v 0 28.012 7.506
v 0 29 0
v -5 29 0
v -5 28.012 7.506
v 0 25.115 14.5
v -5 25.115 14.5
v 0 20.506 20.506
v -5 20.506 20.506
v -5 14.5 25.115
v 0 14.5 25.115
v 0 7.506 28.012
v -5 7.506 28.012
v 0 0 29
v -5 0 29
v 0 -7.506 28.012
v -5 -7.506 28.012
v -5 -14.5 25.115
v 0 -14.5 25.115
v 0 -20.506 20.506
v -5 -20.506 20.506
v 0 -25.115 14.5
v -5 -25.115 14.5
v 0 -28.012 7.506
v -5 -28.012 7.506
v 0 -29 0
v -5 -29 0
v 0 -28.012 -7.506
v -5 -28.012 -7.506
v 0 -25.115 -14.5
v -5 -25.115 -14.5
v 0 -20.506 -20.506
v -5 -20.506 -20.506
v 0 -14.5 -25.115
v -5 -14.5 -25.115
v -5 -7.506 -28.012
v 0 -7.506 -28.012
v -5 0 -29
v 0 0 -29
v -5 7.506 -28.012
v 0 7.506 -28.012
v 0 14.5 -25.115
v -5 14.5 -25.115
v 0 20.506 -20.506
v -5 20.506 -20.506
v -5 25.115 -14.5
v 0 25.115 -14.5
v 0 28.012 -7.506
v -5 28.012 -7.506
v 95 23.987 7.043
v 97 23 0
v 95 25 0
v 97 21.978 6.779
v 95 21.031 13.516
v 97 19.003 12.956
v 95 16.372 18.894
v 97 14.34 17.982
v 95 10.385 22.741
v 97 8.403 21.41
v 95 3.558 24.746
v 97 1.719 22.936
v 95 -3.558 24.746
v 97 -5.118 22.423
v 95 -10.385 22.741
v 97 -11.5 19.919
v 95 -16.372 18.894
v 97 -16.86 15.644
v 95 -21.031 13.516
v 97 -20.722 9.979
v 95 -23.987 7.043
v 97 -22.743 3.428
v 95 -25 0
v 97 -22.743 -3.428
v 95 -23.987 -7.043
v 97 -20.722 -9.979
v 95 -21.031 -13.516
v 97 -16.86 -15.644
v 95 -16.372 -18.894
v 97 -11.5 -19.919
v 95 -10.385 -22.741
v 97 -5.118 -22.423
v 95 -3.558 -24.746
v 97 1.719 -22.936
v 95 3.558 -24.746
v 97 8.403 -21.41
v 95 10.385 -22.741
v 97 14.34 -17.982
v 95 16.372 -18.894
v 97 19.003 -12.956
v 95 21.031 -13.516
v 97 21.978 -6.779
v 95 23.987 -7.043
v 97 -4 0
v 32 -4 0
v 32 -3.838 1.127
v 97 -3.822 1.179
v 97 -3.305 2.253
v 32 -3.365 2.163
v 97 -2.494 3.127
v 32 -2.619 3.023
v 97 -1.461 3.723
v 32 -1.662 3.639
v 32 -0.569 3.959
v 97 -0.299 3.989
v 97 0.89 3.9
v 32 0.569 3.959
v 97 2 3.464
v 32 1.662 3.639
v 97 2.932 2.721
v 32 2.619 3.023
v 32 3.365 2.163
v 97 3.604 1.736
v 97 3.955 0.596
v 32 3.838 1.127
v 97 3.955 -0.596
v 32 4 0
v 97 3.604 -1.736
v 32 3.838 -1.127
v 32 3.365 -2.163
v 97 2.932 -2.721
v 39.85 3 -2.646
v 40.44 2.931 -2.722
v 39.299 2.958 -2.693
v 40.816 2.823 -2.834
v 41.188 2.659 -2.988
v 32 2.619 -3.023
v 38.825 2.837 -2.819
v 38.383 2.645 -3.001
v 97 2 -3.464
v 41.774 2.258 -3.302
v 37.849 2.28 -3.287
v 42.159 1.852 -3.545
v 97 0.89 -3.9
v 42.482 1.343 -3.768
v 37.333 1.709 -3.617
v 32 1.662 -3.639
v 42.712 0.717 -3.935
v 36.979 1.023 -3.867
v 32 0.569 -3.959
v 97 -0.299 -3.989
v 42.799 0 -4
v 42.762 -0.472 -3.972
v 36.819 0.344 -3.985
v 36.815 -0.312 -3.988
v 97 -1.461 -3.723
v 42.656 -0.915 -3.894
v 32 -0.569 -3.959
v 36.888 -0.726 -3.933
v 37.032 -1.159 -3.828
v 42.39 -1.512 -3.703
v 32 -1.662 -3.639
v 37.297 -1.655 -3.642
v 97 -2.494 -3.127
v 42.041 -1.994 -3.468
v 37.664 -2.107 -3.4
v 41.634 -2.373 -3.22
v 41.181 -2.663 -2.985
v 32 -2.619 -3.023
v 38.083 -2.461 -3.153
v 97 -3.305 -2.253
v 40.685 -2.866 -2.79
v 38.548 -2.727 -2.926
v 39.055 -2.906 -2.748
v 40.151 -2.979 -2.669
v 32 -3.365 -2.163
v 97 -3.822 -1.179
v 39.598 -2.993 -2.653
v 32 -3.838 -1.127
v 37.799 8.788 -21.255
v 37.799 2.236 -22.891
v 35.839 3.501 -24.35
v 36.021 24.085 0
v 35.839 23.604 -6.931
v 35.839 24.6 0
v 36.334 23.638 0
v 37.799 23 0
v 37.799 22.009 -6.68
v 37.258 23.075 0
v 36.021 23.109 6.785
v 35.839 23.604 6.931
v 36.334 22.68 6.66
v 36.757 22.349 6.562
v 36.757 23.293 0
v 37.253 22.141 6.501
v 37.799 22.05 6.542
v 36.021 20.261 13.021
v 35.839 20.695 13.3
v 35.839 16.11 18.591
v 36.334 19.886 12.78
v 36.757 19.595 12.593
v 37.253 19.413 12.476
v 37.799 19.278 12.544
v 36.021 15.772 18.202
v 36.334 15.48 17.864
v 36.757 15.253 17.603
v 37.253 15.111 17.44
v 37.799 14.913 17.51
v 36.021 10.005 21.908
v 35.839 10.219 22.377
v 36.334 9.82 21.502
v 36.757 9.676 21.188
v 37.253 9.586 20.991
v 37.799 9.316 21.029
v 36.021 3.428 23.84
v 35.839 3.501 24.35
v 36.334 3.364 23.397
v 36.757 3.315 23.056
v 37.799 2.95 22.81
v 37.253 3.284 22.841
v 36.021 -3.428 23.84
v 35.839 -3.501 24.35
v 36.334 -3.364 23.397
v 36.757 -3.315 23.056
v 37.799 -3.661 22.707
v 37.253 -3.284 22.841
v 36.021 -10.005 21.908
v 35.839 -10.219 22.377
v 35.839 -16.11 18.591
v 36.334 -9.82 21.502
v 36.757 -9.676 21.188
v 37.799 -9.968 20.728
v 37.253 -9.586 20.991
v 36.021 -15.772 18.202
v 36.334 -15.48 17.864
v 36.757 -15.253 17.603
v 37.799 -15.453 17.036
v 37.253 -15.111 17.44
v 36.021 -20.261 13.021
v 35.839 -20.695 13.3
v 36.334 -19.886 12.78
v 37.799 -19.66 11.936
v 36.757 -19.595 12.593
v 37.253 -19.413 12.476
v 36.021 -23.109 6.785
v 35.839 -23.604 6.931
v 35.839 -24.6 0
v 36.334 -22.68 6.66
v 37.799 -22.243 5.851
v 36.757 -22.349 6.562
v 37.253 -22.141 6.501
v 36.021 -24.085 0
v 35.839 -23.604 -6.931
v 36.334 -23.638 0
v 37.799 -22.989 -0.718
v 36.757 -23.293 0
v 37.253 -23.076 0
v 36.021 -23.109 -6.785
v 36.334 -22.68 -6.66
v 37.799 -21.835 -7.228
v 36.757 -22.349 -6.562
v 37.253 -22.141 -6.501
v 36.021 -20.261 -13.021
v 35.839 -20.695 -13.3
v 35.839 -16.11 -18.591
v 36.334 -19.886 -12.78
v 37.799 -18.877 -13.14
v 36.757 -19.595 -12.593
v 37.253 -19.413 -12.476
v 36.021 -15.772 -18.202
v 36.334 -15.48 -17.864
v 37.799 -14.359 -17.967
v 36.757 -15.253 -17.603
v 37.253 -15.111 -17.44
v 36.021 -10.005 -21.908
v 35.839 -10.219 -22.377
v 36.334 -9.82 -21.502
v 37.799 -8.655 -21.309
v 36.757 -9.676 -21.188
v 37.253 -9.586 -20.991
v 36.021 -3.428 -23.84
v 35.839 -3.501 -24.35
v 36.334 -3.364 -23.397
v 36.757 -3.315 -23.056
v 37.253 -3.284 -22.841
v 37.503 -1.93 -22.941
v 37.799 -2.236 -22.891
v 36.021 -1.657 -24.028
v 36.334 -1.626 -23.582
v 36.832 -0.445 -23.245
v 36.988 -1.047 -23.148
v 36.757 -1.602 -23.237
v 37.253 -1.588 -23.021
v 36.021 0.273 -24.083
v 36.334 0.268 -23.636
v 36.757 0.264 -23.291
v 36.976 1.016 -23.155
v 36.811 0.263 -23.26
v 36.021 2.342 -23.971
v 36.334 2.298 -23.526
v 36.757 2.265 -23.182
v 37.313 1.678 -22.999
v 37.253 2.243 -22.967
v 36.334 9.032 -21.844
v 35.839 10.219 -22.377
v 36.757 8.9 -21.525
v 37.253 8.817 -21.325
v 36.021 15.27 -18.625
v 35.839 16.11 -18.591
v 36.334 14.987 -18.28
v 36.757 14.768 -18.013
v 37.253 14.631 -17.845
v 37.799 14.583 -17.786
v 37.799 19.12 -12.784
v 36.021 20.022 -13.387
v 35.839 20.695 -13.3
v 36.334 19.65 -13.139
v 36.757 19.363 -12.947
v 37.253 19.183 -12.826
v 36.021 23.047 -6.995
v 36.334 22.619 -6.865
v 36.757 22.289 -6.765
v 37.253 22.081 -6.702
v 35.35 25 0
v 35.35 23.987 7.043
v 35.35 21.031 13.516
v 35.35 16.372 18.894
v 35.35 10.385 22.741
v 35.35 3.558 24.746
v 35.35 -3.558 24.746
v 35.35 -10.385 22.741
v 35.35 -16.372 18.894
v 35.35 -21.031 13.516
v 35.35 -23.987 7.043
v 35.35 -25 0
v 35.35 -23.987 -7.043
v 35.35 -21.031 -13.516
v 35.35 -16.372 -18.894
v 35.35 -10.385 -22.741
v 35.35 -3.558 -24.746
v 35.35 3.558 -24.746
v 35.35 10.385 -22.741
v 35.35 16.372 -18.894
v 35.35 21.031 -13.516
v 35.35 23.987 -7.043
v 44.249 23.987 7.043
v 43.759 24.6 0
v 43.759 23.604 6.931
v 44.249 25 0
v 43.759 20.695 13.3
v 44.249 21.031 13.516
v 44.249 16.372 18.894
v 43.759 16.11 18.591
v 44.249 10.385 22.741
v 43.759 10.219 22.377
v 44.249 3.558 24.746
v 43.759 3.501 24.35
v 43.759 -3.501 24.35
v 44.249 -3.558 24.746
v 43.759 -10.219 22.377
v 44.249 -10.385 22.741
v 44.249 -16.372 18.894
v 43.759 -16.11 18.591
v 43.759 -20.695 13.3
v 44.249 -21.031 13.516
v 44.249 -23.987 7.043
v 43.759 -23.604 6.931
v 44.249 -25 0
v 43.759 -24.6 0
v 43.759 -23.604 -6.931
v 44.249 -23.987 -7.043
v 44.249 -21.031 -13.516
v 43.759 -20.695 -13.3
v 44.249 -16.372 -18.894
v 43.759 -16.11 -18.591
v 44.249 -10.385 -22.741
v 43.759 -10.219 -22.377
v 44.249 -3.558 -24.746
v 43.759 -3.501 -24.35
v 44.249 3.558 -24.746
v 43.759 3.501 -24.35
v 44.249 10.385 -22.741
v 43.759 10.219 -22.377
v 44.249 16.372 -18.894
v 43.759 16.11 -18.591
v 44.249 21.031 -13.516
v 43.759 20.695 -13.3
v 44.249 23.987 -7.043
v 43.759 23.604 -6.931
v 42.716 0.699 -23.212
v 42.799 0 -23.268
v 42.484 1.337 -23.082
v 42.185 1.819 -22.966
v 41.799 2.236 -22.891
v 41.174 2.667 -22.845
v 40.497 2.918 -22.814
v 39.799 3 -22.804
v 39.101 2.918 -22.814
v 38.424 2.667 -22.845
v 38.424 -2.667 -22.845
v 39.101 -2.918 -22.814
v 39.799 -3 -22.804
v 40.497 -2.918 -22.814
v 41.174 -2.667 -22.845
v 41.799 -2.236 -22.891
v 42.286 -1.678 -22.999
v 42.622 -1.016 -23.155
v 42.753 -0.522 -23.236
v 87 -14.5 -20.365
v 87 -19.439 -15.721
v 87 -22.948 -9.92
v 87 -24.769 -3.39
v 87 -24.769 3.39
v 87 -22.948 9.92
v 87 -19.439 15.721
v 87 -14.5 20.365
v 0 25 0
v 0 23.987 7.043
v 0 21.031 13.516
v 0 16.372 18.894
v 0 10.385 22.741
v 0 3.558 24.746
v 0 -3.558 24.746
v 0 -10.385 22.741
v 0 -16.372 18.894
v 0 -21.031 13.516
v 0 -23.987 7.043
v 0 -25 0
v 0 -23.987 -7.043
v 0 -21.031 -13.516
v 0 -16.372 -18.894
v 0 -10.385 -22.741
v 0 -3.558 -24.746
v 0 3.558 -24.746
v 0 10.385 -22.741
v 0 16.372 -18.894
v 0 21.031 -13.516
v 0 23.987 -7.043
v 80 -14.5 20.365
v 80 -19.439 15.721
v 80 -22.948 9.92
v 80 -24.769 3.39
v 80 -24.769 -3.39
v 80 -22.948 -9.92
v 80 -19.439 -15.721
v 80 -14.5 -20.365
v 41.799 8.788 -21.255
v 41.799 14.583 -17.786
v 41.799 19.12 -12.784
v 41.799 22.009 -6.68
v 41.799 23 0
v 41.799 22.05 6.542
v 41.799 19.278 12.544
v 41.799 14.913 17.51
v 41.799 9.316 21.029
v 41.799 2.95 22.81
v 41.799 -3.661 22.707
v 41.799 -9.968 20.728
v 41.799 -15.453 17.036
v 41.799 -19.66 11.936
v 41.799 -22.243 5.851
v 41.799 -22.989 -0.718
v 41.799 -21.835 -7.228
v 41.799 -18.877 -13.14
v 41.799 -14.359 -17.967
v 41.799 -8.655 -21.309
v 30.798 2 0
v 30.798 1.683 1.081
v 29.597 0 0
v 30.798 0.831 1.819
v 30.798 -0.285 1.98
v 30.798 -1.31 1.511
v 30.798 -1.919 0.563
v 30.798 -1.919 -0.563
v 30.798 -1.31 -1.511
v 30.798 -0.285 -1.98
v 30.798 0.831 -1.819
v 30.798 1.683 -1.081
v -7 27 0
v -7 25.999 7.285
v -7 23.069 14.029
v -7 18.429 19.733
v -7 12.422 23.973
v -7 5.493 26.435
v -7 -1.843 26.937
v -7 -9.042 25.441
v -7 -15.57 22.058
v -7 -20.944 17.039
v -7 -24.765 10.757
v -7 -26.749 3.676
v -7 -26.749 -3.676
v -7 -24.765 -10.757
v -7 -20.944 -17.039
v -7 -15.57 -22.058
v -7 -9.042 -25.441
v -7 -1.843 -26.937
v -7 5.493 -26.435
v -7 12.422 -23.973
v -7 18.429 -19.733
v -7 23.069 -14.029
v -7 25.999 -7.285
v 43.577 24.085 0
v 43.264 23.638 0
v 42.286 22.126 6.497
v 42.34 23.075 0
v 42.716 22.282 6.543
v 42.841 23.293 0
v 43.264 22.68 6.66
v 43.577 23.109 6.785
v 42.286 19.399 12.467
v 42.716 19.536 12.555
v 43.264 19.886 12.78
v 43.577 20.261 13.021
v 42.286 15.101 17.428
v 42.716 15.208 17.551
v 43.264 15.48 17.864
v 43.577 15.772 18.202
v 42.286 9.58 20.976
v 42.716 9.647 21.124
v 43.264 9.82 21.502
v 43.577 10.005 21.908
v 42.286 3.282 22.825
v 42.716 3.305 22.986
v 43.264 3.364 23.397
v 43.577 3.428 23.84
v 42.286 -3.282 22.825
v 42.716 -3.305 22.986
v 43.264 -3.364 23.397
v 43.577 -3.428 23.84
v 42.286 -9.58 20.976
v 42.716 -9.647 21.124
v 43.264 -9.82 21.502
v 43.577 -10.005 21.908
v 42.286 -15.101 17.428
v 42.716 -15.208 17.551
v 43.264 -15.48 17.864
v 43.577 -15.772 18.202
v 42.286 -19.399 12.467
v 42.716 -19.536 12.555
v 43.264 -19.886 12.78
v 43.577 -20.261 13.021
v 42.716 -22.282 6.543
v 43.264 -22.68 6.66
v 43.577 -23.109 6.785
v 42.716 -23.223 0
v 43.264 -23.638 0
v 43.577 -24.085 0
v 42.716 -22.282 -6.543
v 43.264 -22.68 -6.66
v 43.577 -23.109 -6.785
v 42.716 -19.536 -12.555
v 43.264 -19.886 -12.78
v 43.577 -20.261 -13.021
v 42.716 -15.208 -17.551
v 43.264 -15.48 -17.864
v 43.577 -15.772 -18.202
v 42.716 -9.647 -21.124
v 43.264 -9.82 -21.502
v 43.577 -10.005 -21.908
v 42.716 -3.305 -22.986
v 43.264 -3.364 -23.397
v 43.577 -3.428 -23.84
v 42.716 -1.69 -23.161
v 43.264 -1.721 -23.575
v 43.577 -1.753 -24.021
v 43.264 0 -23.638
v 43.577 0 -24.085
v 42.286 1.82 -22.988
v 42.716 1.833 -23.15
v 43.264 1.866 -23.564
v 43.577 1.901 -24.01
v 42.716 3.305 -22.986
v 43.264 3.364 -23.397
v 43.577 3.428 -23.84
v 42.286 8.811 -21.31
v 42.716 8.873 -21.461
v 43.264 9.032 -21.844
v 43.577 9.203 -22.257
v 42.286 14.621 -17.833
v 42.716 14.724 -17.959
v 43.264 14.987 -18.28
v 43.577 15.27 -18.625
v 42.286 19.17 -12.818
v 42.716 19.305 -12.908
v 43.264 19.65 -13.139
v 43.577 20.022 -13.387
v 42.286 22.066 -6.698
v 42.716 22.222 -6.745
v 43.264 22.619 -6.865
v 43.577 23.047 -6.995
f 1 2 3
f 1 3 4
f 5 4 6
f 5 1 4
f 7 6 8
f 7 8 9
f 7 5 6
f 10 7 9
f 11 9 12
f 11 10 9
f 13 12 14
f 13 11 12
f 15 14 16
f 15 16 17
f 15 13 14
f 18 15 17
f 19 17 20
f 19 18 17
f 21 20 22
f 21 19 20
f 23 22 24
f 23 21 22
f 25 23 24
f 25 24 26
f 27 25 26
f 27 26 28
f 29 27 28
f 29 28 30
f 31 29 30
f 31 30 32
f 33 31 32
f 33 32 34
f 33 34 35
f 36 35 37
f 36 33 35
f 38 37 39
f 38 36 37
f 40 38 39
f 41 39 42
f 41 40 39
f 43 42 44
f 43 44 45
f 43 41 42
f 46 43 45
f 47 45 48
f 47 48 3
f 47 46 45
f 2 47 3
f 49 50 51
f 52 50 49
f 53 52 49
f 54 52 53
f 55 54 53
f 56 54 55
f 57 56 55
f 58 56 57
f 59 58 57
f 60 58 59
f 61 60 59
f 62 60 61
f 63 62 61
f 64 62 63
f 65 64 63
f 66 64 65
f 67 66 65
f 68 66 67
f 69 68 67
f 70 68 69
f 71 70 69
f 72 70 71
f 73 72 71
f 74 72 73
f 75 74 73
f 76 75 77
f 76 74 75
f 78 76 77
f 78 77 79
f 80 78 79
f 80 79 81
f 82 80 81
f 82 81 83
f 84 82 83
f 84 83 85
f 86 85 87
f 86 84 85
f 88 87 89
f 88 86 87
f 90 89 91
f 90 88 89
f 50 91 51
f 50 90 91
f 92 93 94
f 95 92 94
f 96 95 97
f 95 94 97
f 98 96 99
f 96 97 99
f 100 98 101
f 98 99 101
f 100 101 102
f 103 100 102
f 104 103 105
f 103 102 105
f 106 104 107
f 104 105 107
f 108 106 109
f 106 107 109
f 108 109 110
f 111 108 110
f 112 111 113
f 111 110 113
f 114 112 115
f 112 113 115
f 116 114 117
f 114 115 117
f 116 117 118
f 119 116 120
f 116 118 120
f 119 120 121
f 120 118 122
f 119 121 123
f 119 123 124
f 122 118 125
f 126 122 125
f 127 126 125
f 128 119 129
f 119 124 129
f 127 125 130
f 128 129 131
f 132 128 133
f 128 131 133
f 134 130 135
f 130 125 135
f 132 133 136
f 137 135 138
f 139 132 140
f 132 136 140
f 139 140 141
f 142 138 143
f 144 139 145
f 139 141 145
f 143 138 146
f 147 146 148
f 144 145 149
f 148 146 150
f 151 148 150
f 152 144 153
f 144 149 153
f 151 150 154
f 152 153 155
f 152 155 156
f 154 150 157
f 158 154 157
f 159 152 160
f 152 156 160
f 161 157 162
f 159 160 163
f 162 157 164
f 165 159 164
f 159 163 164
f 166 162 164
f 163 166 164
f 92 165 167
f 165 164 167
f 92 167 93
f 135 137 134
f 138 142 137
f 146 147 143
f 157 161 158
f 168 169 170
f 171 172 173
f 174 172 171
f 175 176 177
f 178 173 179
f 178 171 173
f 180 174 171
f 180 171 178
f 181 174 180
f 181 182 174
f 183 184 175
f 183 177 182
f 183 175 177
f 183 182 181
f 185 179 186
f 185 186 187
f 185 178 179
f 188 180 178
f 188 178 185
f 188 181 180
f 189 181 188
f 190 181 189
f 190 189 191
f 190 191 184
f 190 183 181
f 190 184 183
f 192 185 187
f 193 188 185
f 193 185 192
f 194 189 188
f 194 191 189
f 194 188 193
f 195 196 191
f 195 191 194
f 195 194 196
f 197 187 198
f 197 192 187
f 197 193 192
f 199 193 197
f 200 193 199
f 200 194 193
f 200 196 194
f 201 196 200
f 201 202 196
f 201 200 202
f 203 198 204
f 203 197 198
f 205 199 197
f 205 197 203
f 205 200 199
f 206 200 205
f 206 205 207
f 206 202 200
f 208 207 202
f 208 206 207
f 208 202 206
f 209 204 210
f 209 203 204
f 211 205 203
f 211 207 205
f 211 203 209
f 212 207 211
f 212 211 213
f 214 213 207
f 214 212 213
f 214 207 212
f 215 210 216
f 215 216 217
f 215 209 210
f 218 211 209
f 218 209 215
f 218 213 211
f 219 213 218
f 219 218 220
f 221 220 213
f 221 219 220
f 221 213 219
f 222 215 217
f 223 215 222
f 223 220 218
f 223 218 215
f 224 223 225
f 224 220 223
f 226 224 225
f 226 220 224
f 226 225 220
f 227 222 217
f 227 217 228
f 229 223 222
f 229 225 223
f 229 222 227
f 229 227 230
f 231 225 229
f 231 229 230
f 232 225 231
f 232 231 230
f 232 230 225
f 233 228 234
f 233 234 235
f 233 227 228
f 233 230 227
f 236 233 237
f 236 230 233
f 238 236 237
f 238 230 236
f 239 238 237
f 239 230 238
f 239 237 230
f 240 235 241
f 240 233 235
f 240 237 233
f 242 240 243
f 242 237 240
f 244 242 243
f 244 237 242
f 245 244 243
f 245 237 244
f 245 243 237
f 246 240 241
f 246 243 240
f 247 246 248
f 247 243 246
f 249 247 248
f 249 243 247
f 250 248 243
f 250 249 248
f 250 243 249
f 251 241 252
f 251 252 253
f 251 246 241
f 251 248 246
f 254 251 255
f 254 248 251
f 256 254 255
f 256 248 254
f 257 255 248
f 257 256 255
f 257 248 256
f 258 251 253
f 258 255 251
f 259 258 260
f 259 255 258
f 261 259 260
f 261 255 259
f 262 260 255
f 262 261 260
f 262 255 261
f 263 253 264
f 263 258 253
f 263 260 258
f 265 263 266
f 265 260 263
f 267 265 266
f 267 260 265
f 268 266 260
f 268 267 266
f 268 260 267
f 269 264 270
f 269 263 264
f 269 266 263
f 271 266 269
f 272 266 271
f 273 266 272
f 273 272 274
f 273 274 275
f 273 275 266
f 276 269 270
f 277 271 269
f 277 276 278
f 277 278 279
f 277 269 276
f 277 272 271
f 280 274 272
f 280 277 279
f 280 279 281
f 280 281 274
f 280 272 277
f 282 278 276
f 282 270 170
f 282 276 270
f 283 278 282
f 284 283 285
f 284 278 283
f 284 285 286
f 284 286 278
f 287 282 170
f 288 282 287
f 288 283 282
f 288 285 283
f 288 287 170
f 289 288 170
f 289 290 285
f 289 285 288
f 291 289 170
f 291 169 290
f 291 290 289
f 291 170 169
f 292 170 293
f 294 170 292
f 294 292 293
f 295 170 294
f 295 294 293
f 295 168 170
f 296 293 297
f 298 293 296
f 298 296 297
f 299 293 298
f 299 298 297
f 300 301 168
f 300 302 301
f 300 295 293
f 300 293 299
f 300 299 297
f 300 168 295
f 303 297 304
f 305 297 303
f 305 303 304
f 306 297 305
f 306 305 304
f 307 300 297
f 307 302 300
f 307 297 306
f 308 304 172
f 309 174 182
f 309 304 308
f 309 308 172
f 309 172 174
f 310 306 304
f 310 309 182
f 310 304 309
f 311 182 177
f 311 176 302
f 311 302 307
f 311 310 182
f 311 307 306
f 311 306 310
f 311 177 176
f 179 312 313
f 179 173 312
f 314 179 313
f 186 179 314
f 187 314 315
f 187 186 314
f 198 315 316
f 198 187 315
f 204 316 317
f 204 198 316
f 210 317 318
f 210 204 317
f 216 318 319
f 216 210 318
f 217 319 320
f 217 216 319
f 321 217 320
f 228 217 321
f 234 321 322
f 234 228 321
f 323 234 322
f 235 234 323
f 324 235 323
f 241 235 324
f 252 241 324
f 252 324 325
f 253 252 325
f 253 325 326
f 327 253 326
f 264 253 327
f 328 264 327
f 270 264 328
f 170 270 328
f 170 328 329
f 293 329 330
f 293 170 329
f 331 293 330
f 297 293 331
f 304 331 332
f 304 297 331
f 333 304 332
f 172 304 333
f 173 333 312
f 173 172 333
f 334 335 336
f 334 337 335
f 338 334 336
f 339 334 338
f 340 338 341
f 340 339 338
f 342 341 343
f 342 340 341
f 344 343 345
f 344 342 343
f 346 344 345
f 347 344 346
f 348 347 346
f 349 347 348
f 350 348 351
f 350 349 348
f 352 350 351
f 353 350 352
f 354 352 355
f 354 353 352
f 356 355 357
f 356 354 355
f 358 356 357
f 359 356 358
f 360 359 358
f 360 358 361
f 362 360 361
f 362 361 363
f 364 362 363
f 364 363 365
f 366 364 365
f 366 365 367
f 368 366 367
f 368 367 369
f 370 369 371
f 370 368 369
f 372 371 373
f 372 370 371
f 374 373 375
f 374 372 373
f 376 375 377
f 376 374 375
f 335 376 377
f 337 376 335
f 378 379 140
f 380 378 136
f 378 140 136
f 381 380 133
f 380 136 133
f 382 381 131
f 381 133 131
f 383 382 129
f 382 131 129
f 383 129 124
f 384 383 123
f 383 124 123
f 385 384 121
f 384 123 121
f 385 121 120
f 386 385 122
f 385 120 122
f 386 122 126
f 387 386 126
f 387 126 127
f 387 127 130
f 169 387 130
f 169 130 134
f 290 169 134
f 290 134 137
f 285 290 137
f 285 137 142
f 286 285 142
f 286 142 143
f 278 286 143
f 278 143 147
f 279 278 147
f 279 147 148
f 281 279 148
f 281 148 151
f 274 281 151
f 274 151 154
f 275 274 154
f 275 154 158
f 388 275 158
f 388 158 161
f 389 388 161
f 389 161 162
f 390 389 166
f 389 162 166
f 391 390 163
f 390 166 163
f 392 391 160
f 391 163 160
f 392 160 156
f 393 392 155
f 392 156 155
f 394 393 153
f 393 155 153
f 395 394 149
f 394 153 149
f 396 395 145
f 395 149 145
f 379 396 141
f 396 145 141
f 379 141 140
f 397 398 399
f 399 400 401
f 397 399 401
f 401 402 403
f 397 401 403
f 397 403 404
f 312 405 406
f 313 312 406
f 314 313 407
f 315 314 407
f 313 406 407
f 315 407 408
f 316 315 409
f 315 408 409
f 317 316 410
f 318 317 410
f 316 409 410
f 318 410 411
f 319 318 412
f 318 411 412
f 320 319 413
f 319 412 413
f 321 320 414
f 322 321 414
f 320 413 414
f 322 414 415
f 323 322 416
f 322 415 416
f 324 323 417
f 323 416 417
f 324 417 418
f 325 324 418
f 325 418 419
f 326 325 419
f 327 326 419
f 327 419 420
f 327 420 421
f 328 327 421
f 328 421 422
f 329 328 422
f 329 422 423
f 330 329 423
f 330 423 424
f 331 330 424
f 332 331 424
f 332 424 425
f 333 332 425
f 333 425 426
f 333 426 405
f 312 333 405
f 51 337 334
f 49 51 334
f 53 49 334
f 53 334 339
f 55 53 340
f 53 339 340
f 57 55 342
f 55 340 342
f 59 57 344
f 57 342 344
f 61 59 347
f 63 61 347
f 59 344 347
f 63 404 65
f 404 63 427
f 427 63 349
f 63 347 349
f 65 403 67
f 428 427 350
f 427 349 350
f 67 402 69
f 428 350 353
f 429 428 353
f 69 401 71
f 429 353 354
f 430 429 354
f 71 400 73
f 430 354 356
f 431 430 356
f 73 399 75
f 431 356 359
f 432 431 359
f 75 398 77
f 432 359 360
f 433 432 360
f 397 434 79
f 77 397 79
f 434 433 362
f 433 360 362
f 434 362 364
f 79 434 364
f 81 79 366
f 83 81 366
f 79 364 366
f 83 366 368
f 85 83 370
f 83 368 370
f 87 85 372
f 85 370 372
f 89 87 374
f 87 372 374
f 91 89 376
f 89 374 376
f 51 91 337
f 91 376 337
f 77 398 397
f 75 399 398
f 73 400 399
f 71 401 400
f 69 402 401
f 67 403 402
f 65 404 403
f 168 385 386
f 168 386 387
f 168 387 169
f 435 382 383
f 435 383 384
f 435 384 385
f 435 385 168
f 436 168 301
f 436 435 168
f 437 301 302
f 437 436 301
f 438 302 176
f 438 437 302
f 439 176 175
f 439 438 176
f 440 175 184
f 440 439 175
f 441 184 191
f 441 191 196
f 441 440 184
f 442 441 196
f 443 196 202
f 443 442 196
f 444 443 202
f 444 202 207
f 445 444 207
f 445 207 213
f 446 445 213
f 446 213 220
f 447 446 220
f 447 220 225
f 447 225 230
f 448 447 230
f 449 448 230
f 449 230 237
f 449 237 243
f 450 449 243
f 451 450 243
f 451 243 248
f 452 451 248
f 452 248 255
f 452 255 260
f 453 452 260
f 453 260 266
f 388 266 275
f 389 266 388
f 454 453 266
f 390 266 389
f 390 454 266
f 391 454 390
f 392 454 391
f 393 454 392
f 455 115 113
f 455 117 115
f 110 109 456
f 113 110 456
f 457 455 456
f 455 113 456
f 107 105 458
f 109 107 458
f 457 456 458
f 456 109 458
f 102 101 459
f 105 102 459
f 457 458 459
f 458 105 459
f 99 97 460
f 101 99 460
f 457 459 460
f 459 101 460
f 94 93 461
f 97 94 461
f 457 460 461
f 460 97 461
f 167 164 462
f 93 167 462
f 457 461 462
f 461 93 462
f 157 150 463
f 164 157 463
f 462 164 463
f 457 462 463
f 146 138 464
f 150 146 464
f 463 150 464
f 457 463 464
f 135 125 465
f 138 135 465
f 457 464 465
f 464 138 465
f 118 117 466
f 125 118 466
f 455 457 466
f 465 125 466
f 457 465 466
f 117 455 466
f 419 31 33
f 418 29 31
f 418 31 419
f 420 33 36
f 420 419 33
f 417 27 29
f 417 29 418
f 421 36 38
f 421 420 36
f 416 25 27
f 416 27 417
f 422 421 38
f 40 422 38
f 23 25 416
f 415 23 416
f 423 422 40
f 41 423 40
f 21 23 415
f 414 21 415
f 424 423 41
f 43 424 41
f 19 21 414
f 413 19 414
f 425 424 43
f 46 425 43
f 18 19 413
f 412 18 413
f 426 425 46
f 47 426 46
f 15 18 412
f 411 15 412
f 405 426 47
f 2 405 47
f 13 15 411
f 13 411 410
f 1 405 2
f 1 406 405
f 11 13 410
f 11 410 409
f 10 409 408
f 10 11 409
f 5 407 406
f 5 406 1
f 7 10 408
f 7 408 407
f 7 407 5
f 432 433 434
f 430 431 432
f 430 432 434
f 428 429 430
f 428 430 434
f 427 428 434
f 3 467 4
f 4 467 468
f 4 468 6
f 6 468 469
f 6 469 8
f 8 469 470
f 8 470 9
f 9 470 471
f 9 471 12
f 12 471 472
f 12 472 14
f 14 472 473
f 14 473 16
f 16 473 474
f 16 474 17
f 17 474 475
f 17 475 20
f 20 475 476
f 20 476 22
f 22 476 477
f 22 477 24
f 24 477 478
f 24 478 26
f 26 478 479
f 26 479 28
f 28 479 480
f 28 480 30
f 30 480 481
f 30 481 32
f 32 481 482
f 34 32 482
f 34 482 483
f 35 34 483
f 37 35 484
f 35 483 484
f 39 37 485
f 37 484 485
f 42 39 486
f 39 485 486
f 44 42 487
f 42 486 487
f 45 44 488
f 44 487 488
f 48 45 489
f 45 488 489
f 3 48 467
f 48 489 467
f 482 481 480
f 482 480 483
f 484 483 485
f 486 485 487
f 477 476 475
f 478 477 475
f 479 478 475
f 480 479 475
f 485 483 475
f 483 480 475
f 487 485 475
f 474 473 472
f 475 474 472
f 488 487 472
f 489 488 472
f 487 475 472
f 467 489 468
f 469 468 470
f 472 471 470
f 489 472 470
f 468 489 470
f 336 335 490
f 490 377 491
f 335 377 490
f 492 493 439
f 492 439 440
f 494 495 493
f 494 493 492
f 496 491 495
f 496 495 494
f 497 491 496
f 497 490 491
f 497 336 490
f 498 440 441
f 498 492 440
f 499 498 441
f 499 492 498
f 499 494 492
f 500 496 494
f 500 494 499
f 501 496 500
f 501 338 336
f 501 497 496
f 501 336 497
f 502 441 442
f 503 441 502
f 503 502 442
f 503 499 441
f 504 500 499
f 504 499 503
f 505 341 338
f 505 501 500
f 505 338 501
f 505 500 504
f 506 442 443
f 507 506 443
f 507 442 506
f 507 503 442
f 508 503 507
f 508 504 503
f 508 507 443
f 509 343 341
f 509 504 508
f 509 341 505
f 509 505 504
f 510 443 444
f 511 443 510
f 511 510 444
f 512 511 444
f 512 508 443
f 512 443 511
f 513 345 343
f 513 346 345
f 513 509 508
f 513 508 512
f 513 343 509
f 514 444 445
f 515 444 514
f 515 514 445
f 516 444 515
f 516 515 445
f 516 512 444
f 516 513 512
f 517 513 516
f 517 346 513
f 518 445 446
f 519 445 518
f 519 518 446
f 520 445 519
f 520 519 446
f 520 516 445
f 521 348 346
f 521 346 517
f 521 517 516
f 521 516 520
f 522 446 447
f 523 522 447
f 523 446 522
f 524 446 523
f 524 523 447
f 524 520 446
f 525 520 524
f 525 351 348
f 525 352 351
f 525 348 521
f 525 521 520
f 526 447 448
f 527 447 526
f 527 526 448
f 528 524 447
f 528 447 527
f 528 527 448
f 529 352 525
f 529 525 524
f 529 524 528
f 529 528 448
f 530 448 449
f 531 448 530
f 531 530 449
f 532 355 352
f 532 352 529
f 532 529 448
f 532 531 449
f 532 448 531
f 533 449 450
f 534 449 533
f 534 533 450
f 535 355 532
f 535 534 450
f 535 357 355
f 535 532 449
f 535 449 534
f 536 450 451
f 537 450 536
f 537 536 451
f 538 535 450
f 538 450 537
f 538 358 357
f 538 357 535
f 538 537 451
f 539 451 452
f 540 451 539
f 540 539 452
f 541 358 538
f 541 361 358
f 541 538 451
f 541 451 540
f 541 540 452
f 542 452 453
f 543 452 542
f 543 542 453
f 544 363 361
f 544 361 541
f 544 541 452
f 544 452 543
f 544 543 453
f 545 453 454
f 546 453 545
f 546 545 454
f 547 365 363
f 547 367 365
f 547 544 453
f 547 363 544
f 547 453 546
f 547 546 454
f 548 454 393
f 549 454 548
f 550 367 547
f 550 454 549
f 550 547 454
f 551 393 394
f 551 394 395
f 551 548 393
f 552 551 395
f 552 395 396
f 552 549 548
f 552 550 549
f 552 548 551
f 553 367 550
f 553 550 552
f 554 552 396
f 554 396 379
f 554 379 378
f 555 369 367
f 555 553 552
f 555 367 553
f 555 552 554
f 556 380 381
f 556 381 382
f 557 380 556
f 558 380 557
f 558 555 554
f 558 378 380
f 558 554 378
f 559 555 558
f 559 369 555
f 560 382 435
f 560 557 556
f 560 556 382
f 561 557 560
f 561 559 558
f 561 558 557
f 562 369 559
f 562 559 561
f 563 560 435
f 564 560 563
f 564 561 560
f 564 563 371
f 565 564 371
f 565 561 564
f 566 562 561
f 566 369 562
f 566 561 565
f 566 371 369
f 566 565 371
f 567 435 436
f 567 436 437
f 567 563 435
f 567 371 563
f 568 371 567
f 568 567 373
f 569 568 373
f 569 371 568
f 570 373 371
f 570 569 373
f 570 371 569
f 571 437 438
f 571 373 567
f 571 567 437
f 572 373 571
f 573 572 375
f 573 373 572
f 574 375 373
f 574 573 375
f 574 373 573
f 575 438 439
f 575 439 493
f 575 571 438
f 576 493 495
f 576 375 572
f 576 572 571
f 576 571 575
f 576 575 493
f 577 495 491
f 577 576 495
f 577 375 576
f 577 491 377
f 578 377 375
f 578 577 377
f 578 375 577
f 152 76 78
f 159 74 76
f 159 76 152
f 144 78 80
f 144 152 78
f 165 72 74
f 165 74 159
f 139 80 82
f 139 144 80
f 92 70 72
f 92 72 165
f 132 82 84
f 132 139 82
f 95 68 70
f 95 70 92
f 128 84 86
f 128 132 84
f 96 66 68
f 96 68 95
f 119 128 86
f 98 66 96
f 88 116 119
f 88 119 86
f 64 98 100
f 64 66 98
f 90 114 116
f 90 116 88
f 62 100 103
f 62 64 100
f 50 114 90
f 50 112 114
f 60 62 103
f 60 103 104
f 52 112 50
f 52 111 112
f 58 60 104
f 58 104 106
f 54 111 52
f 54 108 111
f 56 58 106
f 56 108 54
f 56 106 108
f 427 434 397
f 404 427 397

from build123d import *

# Parameters (mm, degrees)
F0_R      = 25
F1_DEPTH  = 97
F2_SIZE   = 2
F3_R      = 29
F4_DEPTH  = 7
F5_SIZE   = 2
F8_W      = 7
F8_H      = 14.5
F9_DEPTH  = 50
F11_D     = 8
F11_DEPTH = 65
F11_TIP   = 2.4034424761
F13_D     = 6
F13_DEPTH = 29.001


# Not quite as in the source:
# - a fillet or chamfer that OpenCascade refuses, or shapes differently, is made with other operations: its cross-section is extruded or revolved along the edge and cut away or added


with BuildPart() as f1:
    # F0 (on Right) → F1 (new body)
    with BuildSketch(Plane.YZ):
        Circle(F0_R)
    extrude(amount=F1_DEPTH)

    # F2
    f2_edges = [f1.edges().sort_by_distance(p)[0] for p in [
        (97, -25, 0),
    ]]
    chamfer(f2_edges, length=F2_SIZE)

    # F3 (on Right) → F4 (join)
    with BuildSketch(Plane.YZ):
        Circle(F3_R)
    extrude(amount=-F4_DEPTH)

    # F5
    f5_edges = [f1.edges().sort_by_distance(p)[0] for p in [
        (-7, -29, 0),
    ]]
    chamfer(f5_edges, length=F5_SIZE)

    # F6 (on Top) → F7 (revolve, cut)
    with BuildSketch(Plane.XY):
        with BuildLine():
            Line((43.7990407646, 27), (35.7990407646, 27))
            Line((35.7990407646, 27), (35.7990407646, 25))
            ThreePointArc((35.7990407646, 25), (36.3848272022, 23.5857864376), (37.7990407646, 23))
            Line((37.7990407646, 23), (41.7990407646, 23))
            ThreePointArc((41.7990407646, 23), (43.2132543269, 23.5857864376), (43.7990407646, 25))
            Line((43.7990407646, 25), (43.7990407646, 27))
        make_face()
    revolve(axis=Axis((58.3793800324, 0, 0), (1, 0, 0)), mode=Mode.SUBTRACT)

    # F8 (on Top) → F9 (cut, symmetric)
    with BuildSketch(Plane.XY):
        with Locations((83.5, -21.75)):
            Rectangle(F8_W, F8_H)
    extrude(amount=F9_DEPTH, both=True, mode=Mode.SUBTRACT)

    # F11
    with Locations(Plane.YZ.offset(97)):
        with Locations((0, 0)):
            Hole(F11_D / 2, depth=F11_DEPTH)
            with Locations((0, 0, -(F11_DEPTH + F11_TIP / 2))):  # 118° drill point
                Cone(0, F11_D / 2, F11_TIP, mode=Mode.SUBTRACT)

    # F13 (through all, one way)
    with BuildSketch(Plane.XY):
        with Locations((39.7990407646, 0)):
            Circle(F13_D / 2)
    extrude(amount=-F13_DEPTH, mode=Mode.SUBTRACT)

    # F14: chamfer of 0.5 on 2 edges, made by hand

    # F14_s1 → F14_t2 (revolve, cut)
    with BuildSketch(Plane.XY):
        with BuildLine():
            Line((35.3495510218, 25), (35.8394489703, 24.6))
            ThreePointArc((35.8394489703, 24.6), (35.8098979776, 24.7918871147), (35.7990407646, 25))
            Line((35.7990407646, 25), (35.3495510218, 25))
        make_face()
    revolve(axis=Axis((35.7990407646, 0, 0), (1, 0, 0)), mode=Mode.SUBTRACT)

    # F14_s3 → F14_t4 (revolve, cut)
    with BuildSketch(Plane.XY):
        with BuildLine():
            Line((43.7586325588, 24.6), (44.2485305074, 25))
            Line((44.2485305074, 25), (43.7990407646, 25))
            ThreePointArc((43.7990407646, 25), (43.7881835515, 24.7918871147), (43.7586325588, 24.6))
        make_face()
    revolve(axis=Axis((43.7990407646, 0, 0), (1, 0, 0)), mode=Mode.SUBTRACT)


solid = f1.part
